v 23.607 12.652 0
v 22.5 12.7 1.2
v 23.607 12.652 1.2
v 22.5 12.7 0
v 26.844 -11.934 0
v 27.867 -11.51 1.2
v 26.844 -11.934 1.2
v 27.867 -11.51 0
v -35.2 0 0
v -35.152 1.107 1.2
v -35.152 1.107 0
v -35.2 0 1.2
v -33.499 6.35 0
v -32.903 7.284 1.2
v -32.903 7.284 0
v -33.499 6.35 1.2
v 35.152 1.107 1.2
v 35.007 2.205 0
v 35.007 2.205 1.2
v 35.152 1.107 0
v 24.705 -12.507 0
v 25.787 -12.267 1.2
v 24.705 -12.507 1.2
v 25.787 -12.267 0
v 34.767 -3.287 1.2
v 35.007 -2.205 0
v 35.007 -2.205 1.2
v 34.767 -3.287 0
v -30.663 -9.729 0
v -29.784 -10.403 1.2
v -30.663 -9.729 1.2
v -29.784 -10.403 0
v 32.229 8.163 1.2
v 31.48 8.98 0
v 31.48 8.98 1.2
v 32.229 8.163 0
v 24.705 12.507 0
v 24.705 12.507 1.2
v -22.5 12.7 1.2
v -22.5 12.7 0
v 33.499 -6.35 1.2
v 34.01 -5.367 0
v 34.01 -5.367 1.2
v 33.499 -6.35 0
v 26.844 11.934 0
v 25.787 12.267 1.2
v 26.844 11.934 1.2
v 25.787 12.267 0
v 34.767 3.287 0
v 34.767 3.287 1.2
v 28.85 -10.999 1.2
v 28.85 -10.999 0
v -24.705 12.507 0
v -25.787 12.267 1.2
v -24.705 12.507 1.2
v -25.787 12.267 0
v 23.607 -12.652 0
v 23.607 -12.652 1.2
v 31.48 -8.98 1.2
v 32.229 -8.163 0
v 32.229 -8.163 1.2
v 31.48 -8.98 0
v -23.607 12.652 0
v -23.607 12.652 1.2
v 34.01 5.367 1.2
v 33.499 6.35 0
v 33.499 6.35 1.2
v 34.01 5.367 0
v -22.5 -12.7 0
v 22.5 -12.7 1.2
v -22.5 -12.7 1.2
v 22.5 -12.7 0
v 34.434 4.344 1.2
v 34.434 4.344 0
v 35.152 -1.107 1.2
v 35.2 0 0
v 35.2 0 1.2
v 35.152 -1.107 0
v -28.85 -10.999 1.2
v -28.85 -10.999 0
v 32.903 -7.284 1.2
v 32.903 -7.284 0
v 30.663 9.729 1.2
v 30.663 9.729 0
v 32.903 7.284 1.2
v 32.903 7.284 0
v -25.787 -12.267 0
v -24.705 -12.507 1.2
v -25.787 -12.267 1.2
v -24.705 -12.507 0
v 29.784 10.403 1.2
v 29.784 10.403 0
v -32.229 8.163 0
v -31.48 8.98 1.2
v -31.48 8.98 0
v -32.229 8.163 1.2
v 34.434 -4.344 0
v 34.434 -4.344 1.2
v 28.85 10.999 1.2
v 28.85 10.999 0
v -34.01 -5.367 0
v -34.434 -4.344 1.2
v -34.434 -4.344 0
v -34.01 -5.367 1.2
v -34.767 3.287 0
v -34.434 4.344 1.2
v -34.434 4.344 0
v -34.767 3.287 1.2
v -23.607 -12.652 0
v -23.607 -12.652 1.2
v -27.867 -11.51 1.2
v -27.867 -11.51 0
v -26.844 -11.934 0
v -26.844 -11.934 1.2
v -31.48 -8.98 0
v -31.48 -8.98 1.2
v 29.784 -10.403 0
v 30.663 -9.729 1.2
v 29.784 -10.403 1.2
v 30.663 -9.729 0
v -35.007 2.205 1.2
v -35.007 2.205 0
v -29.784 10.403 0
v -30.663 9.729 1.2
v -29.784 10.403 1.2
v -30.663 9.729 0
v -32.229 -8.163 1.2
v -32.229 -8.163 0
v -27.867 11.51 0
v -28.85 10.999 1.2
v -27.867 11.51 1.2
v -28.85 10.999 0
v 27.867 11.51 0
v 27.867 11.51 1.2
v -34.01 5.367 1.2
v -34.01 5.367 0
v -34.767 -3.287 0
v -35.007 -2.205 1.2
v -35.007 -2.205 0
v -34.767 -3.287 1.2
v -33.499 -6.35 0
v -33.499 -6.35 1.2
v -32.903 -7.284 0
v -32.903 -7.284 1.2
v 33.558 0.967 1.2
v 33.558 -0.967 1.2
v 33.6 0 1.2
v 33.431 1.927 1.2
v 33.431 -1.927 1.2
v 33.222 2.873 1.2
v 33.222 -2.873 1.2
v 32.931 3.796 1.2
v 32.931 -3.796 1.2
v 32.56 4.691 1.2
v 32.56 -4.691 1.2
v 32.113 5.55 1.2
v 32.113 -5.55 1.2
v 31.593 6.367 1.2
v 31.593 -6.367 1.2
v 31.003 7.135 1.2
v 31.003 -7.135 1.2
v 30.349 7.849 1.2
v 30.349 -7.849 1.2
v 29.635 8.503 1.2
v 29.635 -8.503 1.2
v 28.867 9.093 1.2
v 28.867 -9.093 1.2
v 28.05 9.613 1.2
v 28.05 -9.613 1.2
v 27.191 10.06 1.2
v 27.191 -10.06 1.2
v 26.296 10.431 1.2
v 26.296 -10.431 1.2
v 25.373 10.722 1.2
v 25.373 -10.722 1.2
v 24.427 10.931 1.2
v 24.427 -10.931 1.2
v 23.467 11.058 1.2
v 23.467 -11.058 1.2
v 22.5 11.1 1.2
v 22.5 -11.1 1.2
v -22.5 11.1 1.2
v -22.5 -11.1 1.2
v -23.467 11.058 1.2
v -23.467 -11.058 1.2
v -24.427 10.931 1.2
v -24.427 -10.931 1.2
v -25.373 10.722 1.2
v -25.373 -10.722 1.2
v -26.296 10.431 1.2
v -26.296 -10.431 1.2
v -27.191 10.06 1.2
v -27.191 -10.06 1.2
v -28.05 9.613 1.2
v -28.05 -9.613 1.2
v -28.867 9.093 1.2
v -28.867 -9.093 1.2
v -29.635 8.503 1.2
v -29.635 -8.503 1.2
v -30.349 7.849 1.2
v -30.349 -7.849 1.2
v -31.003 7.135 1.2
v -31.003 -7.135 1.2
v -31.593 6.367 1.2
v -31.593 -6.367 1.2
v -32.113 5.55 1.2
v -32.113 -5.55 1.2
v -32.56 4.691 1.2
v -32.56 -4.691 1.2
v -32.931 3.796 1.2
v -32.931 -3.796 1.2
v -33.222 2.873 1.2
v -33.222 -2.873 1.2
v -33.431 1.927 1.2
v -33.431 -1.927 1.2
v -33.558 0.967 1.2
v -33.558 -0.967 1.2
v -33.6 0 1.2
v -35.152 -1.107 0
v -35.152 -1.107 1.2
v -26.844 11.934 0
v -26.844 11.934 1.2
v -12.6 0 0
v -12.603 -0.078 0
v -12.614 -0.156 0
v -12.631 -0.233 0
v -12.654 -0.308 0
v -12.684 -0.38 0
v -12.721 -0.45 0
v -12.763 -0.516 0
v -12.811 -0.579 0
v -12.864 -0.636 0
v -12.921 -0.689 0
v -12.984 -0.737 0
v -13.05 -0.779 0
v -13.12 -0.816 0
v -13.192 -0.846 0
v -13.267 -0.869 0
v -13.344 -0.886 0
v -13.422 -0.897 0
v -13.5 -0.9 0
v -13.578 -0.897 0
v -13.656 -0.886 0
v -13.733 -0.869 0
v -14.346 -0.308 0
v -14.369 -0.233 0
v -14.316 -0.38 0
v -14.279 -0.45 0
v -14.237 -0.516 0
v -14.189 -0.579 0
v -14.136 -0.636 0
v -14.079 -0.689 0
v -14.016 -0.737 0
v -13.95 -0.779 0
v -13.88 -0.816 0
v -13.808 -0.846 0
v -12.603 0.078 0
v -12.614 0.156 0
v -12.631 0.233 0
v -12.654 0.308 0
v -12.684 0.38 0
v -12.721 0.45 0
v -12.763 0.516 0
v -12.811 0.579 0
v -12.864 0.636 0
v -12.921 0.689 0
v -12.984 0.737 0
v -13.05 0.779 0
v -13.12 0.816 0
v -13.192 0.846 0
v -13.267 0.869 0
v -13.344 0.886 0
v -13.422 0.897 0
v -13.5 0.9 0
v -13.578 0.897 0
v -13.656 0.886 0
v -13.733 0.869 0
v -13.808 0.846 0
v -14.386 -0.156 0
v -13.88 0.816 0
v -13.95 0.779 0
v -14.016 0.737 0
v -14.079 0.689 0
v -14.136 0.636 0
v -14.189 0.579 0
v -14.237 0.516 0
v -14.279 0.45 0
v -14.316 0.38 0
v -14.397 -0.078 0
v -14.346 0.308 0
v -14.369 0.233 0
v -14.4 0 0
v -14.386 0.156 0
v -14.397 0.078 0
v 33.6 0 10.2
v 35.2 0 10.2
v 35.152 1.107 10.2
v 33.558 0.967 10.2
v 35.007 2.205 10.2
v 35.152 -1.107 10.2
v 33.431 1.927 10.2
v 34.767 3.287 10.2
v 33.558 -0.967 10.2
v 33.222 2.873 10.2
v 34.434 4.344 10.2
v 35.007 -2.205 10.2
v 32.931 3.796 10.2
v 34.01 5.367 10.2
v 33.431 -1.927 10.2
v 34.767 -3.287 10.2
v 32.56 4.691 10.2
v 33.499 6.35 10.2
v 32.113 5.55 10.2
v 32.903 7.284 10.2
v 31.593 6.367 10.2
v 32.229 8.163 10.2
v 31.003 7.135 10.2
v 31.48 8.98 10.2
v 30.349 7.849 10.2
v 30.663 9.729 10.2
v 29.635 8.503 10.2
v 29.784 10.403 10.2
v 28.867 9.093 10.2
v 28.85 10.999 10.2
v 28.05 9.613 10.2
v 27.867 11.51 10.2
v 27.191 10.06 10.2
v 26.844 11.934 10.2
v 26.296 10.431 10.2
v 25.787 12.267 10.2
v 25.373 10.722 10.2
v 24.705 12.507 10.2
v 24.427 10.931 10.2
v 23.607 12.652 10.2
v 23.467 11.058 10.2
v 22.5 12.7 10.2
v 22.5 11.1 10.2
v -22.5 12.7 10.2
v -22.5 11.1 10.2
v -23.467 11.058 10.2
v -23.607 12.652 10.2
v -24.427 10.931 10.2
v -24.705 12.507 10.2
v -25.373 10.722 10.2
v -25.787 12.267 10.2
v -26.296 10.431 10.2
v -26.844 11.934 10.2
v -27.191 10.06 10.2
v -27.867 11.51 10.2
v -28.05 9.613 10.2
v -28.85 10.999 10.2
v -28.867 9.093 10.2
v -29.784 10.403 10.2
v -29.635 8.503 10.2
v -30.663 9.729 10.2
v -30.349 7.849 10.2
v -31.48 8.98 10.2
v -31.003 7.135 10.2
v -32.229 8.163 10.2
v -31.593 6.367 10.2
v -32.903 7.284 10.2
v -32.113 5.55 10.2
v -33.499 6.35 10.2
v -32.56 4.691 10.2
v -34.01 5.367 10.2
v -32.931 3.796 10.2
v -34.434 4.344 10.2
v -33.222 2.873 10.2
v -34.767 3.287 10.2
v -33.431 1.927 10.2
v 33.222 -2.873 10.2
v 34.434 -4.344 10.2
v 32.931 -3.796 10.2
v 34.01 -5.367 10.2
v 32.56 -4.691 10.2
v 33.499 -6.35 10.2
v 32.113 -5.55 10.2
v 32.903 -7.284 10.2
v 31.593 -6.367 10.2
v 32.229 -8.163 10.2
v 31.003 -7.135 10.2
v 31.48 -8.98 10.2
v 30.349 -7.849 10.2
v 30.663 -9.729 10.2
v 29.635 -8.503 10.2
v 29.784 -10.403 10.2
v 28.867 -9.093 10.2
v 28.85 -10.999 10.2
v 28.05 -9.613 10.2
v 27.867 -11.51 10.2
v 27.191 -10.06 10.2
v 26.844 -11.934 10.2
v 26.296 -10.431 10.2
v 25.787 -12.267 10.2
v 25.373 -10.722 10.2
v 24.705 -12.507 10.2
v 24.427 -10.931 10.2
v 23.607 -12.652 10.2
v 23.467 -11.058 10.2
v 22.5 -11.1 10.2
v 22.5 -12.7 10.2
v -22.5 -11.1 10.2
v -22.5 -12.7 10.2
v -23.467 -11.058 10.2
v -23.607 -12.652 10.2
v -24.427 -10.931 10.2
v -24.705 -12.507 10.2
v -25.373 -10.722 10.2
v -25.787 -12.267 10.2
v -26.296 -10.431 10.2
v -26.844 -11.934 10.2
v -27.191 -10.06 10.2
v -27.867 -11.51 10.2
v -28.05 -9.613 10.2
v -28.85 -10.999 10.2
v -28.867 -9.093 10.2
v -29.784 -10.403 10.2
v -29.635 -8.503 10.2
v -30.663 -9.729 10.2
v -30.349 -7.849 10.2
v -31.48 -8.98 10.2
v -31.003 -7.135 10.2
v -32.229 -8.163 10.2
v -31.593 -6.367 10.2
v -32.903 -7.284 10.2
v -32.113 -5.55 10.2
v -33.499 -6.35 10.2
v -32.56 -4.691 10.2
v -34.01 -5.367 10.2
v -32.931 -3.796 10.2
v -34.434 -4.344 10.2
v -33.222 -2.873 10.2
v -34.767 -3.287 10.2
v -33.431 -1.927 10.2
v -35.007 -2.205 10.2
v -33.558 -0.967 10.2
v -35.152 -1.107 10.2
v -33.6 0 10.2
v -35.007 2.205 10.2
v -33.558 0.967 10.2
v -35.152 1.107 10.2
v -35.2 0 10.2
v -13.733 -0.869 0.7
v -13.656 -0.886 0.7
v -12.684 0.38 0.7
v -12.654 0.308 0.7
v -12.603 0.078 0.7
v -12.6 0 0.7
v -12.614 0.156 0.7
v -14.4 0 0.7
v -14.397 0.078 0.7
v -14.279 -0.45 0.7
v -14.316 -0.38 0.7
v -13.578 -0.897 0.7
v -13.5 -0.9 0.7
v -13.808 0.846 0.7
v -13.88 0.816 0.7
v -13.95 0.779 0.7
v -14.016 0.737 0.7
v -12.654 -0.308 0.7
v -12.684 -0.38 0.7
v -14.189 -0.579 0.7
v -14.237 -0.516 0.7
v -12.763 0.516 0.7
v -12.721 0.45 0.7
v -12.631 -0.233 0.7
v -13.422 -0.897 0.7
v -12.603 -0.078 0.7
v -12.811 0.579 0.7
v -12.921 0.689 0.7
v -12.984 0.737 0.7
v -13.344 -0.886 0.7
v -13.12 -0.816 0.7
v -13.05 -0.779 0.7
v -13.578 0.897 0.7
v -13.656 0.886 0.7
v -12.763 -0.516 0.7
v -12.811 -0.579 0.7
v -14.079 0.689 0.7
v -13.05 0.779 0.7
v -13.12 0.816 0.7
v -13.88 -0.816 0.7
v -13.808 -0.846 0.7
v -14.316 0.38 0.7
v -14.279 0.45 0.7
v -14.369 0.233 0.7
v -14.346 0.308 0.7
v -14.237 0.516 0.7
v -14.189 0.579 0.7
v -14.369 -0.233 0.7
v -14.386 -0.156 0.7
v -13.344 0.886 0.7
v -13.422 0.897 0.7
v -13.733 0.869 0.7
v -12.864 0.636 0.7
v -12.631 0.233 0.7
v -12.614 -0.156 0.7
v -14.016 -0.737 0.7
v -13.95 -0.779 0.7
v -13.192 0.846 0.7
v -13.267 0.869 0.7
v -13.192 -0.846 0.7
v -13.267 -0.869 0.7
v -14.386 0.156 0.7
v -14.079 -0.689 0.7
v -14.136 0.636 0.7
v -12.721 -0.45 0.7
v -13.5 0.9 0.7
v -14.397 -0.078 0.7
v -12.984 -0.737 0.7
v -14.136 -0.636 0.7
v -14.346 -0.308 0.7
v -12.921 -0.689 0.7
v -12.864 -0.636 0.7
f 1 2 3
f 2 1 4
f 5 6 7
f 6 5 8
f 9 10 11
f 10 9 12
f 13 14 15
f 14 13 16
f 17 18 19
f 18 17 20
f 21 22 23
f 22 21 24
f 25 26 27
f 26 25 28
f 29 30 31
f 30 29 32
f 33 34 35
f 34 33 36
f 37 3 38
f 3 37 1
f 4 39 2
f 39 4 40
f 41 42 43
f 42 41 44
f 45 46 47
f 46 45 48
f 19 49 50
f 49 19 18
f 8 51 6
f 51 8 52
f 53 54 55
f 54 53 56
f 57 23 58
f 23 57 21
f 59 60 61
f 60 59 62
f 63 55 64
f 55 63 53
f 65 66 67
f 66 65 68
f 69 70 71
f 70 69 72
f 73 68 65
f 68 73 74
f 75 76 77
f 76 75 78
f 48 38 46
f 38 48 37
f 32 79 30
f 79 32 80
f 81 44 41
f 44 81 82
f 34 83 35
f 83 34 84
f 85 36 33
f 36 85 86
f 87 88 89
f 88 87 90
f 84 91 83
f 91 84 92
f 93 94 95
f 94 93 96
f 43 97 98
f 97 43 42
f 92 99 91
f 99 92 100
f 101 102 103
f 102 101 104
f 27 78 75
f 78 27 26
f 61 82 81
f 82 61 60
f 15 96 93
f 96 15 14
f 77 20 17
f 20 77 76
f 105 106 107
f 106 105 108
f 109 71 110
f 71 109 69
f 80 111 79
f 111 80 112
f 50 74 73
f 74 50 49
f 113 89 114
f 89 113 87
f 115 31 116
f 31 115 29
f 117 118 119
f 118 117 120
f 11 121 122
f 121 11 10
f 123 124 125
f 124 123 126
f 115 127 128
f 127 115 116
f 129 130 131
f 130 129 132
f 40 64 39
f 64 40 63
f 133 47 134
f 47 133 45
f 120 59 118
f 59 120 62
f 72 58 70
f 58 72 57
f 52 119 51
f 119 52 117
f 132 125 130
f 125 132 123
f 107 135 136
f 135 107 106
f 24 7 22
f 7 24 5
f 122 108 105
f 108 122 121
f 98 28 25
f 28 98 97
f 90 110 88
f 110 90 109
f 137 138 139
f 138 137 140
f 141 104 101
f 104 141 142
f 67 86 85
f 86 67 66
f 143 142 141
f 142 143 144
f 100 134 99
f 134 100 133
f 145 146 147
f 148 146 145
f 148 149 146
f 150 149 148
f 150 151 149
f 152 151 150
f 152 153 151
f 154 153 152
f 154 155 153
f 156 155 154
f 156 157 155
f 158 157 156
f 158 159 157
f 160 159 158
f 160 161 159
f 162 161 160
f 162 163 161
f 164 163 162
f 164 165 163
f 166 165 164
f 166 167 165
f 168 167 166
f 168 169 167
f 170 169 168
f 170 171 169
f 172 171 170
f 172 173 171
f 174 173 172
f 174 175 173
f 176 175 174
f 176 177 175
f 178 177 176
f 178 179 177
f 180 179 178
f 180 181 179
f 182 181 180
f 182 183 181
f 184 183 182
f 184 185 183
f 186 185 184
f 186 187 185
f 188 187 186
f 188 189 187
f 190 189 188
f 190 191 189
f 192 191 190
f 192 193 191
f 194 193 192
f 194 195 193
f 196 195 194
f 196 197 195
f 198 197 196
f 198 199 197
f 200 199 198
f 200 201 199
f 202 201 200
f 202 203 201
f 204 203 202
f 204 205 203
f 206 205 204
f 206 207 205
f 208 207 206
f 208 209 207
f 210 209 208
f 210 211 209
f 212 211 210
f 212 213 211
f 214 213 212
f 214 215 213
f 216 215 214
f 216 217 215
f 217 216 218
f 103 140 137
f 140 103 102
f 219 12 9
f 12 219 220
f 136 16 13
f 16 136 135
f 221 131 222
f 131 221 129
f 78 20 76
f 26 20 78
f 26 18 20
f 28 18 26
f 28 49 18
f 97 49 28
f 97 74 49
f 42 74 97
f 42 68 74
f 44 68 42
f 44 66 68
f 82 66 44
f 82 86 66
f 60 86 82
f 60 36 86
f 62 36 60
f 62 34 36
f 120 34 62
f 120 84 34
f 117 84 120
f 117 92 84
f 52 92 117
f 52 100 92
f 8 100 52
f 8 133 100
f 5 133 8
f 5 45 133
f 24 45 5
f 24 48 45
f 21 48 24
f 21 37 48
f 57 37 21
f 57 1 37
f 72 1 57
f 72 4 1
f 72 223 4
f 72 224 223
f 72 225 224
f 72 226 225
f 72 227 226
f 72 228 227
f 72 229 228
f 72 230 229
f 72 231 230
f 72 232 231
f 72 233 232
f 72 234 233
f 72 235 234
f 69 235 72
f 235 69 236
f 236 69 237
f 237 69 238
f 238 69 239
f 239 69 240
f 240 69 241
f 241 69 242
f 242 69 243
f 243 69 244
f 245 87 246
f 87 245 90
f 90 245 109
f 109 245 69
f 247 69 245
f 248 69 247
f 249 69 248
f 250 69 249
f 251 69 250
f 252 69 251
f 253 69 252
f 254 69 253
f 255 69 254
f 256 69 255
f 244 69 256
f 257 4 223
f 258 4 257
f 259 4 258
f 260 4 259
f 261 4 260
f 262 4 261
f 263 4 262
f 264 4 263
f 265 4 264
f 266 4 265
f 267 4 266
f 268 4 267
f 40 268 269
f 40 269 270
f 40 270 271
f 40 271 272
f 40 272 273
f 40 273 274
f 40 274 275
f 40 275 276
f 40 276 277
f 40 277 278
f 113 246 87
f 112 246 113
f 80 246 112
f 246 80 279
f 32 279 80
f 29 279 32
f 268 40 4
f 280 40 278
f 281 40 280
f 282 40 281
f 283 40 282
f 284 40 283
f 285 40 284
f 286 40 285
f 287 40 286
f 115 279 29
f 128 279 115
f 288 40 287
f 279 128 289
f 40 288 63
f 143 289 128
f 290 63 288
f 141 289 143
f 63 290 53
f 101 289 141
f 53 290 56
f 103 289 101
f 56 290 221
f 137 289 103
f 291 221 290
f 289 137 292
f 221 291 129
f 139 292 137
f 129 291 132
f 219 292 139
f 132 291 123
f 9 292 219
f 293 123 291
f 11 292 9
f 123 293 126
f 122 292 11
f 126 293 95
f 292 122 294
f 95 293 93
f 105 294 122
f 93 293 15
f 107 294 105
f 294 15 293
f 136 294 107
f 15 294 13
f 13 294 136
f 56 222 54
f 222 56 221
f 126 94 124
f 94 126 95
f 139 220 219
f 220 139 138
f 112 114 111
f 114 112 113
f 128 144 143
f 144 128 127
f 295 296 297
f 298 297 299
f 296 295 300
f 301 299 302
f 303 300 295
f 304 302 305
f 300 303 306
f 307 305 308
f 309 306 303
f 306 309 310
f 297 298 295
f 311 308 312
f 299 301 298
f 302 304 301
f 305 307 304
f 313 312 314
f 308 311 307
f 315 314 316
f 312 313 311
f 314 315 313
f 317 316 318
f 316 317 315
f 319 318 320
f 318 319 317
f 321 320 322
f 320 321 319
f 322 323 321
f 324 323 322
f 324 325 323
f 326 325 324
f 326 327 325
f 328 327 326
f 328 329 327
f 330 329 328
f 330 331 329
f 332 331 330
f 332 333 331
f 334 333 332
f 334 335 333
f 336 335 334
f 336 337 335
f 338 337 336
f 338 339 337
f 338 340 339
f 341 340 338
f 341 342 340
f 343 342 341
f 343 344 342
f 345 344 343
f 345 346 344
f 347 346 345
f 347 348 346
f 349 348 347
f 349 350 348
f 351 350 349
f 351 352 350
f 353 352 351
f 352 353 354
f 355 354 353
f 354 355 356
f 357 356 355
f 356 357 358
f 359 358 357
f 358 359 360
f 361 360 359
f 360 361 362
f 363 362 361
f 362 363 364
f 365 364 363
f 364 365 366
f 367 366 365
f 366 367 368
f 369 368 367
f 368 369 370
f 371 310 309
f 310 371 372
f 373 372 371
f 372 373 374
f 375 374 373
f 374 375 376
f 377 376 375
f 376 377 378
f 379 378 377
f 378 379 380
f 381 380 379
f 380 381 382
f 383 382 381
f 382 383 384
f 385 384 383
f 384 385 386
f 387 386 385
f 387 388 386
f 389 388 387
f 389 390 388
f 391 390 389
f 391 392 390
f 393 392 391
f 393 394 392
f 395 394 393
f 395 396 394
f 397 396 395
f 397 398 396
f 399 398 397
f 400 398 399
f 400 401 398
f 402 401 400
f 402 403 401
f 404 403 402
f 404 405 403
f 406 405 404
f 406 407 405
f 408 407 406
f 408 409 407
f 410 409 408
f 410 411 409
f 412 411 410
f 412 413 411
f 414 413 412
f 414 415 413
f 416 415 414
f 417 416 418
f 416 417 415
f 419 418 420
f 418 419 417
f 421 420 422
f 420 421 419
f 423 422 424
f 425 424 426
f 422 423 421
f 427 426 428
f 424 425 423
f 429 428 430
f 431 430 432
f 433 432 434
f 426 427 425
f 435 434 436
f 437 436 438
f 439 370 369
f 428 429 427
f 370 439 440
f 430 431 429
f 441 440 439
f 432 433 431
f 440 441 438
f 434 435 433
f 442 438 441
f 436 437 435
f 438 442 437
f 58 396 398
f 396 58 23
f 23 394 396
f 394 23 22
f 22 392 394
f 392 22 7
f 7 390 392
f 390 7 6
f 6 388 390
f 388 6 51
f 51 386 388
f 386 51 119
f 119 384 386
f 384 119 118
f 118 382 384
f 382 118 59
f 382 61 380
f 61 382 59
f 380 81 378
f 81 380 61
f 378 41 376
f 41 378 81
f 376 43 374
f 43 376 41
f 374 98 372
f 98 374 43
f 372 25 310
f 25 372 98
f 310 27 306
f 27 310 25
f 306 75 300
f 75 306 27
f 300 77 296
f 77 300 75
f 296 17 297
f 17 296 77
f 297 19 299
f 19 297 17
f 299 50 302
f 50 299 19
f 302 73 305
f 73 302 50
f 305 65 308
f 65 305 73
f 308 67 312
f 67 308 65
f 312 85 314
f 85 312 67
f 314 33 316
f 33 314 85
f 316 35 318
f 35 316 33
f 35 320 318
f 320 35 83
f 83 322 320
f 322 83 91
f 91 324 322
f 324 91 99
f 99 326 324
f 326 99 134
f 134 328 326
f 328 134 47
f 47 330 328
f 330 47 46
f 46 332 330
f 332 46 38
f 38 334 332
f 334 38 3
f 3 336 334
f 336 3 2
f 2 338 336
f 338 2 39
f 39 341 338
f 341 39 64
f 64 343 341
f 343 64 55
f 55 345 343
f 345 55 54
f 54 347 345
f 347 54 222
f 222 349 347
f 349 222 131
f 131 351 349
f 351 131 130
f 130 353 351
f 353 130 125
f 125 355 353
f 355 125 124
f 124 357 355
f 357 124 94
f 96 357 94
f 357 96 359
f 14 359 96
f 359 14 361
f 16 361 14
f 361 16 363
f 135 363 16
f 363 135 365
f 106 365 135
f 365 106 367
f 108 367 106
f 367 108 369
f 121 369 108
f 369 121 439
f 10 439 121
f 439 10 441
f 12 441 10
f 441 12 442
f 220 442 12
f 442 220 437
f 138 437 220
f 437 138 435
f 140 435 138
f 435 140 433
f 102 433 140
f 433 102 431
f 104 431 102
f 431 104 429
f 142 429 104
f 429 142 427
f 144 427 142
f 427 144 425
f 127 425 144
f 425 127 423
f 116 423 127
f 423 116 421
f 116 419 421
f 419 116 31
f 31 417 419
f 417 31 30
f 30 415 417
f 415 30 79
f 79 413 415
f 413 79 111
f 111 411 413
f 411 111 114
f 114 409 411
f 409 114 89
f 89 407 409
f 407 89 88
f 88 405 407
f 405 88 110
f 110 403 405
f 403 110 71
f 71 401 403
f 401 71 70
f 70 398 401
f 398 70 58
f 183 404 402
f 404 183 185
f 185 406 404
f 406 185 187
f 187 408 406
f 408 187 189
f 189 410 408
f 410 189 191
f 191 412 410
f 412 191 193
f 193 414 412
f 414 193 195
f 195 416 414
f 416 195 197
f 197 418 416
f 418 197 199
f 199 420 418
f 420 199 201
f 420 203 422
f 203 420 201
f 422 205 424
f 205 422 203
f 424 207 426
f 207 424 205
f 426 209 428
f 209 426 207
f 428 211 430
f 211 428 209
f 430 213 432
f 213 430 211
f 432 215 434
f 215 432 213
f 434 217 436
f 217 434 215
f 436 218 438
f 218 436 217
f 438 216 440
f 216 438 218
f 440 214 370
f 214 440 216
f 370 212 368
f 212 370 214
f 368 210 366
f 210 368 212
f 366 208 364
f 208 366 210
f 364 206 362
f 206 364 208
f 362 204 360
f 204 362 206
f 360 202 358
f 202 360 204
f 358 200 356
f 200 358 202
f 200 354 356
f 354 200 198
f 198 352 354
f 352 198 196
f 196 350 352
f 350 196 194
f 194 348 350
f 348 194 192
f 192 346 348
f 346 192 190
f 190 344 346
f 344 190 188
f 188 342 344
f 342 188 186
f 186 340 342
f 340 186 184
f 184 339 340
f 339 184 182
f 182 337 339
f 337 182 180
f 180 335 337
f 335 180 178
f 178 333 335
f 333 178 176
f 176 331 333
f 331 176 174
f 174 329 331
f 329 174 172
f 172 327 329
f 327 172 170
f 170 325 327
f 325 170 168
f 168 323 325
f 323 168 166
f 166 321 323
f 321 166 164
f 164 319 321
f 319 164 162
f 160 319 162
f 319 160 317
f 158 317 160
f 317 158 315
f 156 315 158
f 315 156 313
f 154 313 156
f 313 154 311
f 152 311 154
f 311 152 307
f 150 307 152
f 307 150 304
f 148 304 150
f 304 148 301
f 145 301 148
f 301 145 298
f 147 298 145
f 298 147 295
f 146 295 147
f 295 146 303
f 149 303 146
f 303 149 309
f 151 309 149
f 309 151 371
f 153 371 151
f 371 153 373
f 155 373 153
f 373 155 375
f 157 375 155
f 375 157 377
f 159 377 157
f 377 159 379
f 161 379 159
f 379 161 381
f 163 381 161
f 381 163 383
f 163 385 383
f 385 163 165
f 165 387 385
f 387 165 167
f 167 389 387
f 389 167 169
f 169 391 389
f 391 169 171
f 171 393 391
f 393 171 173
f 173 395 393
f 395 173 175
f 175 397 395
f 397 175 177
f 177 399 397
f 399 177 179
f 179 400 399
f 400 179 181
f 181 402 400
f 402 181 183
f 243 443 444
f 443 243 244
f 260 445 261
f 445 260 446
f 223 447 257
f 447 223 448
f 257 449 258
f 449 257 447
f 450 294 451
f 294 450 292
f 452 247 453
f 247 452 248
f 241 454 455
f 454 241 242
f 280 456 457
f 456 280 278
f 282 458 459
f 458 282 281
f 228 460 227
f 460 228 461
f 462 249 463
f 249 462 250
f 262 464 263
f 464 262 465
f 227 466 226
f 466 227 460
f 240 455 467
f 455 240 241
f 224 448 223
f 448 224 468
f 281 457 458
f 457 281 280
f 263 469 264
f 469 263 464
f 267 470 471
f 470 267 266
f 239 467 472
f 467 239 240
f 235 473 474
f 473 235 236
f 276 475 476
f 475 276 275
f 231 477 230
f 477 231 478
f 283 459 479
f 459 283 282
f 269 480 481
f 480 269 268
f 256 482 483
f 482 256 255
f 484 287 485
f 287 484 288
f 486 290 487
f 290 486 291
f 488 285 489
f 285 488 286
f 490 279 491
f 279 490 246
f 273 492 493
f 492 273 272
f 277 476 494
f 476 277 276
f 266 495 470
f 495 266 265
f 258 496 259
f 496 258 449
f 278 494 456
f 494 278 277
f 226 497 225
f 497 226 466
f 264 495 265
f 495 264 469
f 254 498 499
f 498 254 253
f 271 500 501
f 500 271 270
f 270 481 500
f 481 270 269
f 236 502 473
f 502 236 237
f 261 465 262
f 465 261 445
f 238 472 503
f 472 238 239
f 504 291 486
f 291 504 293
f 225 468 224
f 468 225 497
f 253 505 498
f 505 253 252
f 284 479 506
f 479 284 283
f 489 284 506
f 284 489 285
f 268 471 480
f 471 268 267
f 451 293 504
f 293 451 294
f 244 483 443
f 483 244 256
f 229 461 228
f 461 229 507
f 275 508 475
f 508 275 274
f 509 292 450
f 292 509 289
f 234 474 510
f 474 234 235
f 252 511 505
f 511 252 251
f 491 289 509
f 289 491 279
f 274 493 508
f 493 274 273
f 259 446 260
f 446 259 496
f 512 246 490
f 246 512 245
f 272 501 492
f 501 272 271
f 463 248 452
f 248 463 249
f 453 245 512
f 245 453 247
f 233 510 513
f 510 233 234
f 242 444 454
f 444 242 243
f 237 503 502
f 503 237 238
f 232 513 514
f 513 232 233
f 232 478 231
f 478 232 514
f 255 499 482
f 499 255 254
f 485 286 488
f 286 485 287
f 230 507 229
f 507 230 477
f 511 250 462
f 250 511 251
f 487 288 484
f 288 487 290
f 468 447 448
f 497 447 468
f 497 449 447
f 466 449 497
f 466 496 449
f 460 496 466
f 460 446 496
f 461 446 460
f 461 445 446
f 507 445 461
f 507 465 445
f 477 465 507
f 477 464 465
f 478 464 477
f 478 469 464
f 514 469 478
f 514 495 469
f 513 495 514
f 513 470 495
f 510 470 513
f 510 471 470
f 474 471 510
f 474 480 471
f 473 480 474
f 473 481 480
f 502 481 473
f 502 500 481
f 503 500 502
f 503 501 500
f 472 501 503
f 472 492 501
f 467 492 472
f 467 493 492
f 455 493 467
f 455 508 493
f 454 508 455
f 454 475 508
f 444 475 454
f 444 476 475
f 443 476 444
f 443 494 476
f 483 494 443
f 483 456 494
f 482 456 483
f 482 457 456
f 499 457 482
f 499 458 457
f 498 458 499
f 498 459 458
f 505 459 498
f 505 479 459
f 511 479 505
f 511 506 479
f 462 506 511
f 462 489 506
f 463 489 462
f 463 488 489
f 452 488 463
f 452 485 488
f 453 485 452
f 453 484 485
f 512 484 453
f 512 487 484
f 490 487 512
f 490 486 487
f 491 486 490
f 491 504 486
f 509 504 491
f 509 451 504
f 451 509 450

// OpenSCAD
// file: ../bolt.scad
bolt_pts  = [[155.0,300.0], [75.0,180.0], [130.0,180.0], [45.0,30.0]];
pixel_pts = [[155.0,300.0], [145.5,285.8], [136.0,271.5], [126.5,257.2], [117.0,243.0], [107.5,228.8], [98.0,214.5], [88.5,200.2], [79.0,186.0], [95.1,180.0], [112.3,180.0], [129.4,180.0], [121.4,164.8], [113.0,149.9], [104.5,135.1], [96.1,120.2], [87.6,105.3], [79.2,90.4], [70.8,75.5], [62.3,60.6], [53.9,45.7], [45.4,30.8]];

// ===== CHARGE lightning-bolt test piece — option C (~18mm channel) =====
bolt_inner     = 18;                       // channel interior (collar O16 fits)
bolt_wall      = 2;                         // wall thickness
bolt_outer     = bolt_inner + 2*bolt_wall; // 22mm outer stroke
bolt_gap       = 15;                       // LED-tip -> lens
bolt_ch_h      = dome_clear + bolt_gap;    // wall height above plate
bolt_lens_t    = 1.5;                       // lens face thickness
bolt_lip_h     = 2;                         // lens locating lip depth
bolt_lip_clear = 0.6;                       // lip clearance into channel
bolt_lip_t     = 1.2;                       // lip wall thickness

module bolt_stroke(w) {
    for (i = [0 : len(bolt_pts) - 2])
        hull() {
            translate(bolt_pts[i])     circle(d = w);
            translate(bolt_pts[i + 1]) circle(d = w);
        }
}

// wall_h = channel wall height above the plate (gap = wall_h - dome_clear).
// The lens caps the cross-section, so the SAME lens fits any wall_h.
module bolt_shell(wall_h = bolt_ch_h) {
    difference() {
        union() {
            linear_extrude(plate_t) bolt_stroke(bolt_outer);
            translate([0, 0, plate_t]) linear_extrude(wall_h)
                difference() { bolt_stroke(bolt_outer); bolt_stroke(bolt_inner); }
        }
        for (p = pixel_pts)
            translate([p[0], p[1], -0.1]) cylinder(h = plate_t + 0.2, d = pixel_through);
    }
    for (p = pixel_pts) place_collar(p[0], p[1]);
}

module bolt_lens() {
    union() {
        linear_extrude(bolt_lens_t) bolt_stroke(bolt_outer);
        translate([0, 0, bolt_lens_t]) linear_extrude(bolt_lip_h)
            difference() {
                bolt_stroke(bolt_inner - bolt_lip_clear);
                bolt_stroke(bolt_inner - bolt_lip_clear - 2 * bolt_lip_t);
            }
    }
}

// ----- snap-OVER lens: a cap that wraps the WHOLE bolt outside (skirt grips the
// 22mm outer wall). Works because the bolt is a single isolated piece. Top = the
// diffuser face. Print top-down, flip in use; fits any bolt height.
// 2-filament: clear for the first cap_top_t (top), white above (skirt) via a
// slicer height color-change. 3-filament: also paint the skirt's outer wall black.
cap_clear   = 0.3;   // skirt-inner = bolt_outer + this (slide/snap over)
cap_wall    = 1.6;   // skirt wall thickness
cap_top_t   = 1.2;   // diffuser top thickness
cap_skirt_h = 9;     // how far the skirt wraps down the bolt sides

module bolt_overcap() {
    si = bolt_outer + cap_clear;
    so = si + 2 * cap_wall;
    union() {
        linear_extrude(cap_top_t) bolt_stroke(so);
        translate([0, 0, cap_top_t]) linear_extrude(cap_skirt_h)
            difference() { bolt_stroke(so); bolt_stroke(si); }
    }
}

// Fit-test chunk: a short straight section of the over-cap at a chosen skirt
// clearance. Slide it onto a straight part of the printed bolt to feel the fit.
// `marks` debossed dots on the bed face = which one it is (more dots = tighter).
module cap_chunk(clear, marks, L = 45) {
    si = bolt_outer + clear;
    so = si + 2 * cap_wall;
    difference() {
        union() {
            linear_extrude(cap_top_t)
                hull() { translate([-L/2,0]) circle(d=so); translate([L/2,0]) circle(d=so); }
            translate([0,0,cap_top_t]) linear_extrude(cap_skirt_h)
                difference() {
                    hull() { translate([-L/2,0]) circle(d=so); translate([L/2,0]) circle(d=so); }
                    hull() { translate([-L/2,0]) circle(d=si); translate([L/2,0]) circle(d=si); }
                }
        }
        for (i = [0 : marks - 1])
            translate([-L/2 + 9 + i*4, 0, -0.1]) cylinder(h = 0.8, d = 1.8);
    }
}
// file: ../collar.scad
// Calibrated press-fit collar, merged into the rear wall at each pixel.
// The STL is symmetric top/bottom (retention lip at mid-height), so insertion
// direction does not matter. Native STL sits X-centered at collar_cx, Z 0..collar_h.

module collar_solid() {
    translate([-collar_cx, 0, 0])
        import(collar_stl, convexity = 6);
}

module place_collar(x, y) {
    translate([x, y, 0]) collar_solid();
}
// file: ../config.scad
// ===== CHARGE LED sign — global config =====
// Edit this file; then run ./build.sh to regenerate every STL.

$fn = 72;

// ---- calibrated collar (press-fit for 12mm bullet pixel) ----
collar_stl    = "../../assets/bullet-collar.stl"; // path resolved from src/parts/ entry files
collar_h      = 2.0;     // Z span of the collar STL
collar_od     = 16.0;    // collar outer diameter
collar_cx     = 43.0;    // STL native X center (Y center is 0)
pixel_through = 12.3;    // clearance hole through the plate (just over bore Ø12.19)
dome_clear    = 4.0;     // dome protrusion above plate front. Spec: 5.5mm dome-tip-to-flange,
                         // flange seats on plate back, minus 2mm plate ~= 3.5-4mm. Seat a real
                         // pixel and measure to lock it in.

// ---- shell ----
plate_t    = 2.0;        // rear plate thickness (== collar_h, so the collar sits flush)
wall_t     = 2.5;        // chimney wall thickness
cell_inner = 30;         // square interior of each test cell (the press-fit opening)

// ---- diffuser panels (flat, drop-in — kept for the final glued option) ----
panel_press_clear = 0.25; // panel is this much SMALLER than the opening (total) -> friction fit
panel_thicks      = [1, 2, 3];

// ---- diffuser CAP (slides over an ISOLATED chimney; not used on touching rows) ----
cap_fit_clear = 0.4;   // skirt-inner minus chimney-outer (total); bigger = looser slide
cap_skirt_t   = 1.6;   // skirt wall thickness
cap_skirt_h   = 7;     // how far the skirt grips down over the chimney

// ---- diffuser LID = flanged plug (plug locates in the opening, flange catches on the rim) ----
lid_flange_cover = wall_t;  // flange overhang per side ~= wall width (rests on rim, can't fall in)
lid_flange_gap   = 0.3;     // shrink the flange a hair so neighbour lids don't clash
lid_plug_h       = 4;       // how far the plug drops into the opening (0 = plain flat tile)
lid_plug_clear   = 0.2;     // plug-outer = opening minus this (total) -> friction fit
                            // (was 0.5/loose; PETG plug in a PLA hole grips well at 0.2)
lid_plug_wall    = 1.5;     // plug-frame wall thickness

// ---- coupon depth ladder ----
led_gaps = [10, 15, 20]; // clear LED-tip -> diffuser distance, per cell (mm)
                         // (was [20,35,50] — 35/50 went too dim/washed; 20 is the new max)

// ---- collar v2: original bore + lip, plus a 45-deg lead-in chamfer ----
bore_face_r   = 6.10;    // collar bore radius at each face (~Ø12.2)
chamfer_depth = 0.5;     // axial depth of the 45-deg lead-in at each face
mouth_r       = bore_face_r + chamfer_depth;  // chamfer mouth radius (~Ø13.2)

// ---- collar A/B test harness ----
harness_w     = 52;      // tile width
harness_d     = 30;      // tile depth
harness_t     = plate_t; // match the real wall thickness for a faithful fit test
harness_pitch = 24;      // spacing between the two hole centers

// ---- derived ----
cell_pitch = cell_inner + 2 * wall_t;      // outer cell footprint (35)
n_cells    = len(led_gaps);
plate_w    = n_cells * cell_pitch;
plate_d    = cell_pitch;
panel_side = cell_inner - panel_press_clear;
function cell_x(i)     = i * cell_pitch + cell_pitch / 2;   // column center (distance)
function cell_y(j)     = j * cell_pitch + cell_pitch / 2;   // row center (for grid coupons)
function chimney_H(i)  = plate_t + dome_clear + led_gaps[i];
// main file
// Fit test: over-cap skirt clearance 0.2mm (1 dot). Loosest of the three.
include <../config.scad>
include <../collar.scad>
include <../bolt.scad>
cap_chunk(0.2, 1);
